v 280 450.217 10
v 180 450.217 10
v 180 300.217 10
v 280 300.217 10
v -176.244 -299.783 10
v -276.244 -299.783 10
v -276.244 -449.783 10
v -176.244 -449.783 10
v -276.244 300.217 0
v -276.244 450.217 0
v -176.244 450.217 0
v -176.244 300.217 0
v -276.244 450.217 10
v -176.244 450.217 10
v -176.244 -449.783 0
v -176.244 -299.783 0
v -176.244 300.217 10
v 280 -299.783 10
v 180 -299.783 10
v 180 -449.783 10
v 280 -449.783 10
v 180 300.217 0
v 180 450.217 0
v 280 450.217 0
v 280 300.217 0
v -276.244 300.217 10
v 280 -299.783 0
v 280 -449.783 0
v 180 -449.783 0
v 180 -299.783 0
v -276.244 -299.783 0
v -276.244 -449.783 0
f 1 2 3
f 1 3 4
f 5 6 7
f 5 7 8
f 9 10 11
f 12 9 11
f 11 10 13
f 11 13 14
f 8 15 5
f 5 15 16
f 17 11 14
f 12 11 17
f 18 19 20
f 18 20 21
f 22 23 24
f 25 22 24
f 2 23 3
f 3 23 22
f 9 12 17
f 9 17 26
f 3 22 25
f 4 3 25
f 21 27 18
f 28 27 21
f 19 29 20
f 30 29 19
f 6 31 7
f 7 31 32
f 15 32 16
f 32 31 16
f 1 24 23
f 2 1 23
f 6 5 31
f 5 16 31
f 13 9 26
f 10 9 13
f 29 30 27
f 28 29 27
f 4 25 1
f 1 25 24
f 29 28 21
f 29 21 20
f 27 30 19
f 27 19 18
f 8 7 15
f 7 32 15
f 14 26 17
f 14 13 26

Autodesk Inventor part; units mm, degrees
ref_plane "YZ Plane" through (0, 0, 0) normal (1, 0, 0) x (0, 1, 0)
ref_plane "XZ Plane" through (0, 0, 0) normal (0, 1, 0) x (-1, 0, 0)
ref_plane "XY Plane" through (0, 0, 0) normal (0, 0, 1) x (1, 0, 0)
ref_plane "Plano de trabajo1" through (0, 0, 0) normal (0, 0, 1) x (1, 0, 0)
sketch "Boceto1" plane through (0, 0, 0) normal (0, 0, 1) x (1, 0, 0)
  line L0 (-296.2443, -449.783) -> (-296.2443, -299.783) projected
  line L1 (-296.2443, 300.217) -> (-296.2443, 450.217) projected
  line L2 (303.7557, 450.217) -> (303.7557, 300.217) projected
  line L3 (303.7557, -299.783) -> (303.7557, -449.783) projected
  line L4 (-276.2443, -449.783) -> (-176.2443, -449.783)
  line L5 (-176.2443, -449.783) -> (-176.2443, -299.783)
  line L6 (-176.2443, -299.783) -> (-276.2443, -299.783)
  line L7 (-276.2443, -299.783) -> (-276.2443, -449.783)
  line L8 (280, -449.783) -> (180, -449.783)
  line L9 (180, -449.783) -> (180, -299.783)
  line L10 (180, -299.783) -> (280, -299.783)
  line L11 (280, -299.783) -> (280, -449.783)
  line L12 (-276.2443, 450.217) -> (-176.2443, 450.217)
  line L13 (-176.2443, 450.217) -> (-176.2443, 300.217)
  line L14 (-176.2443, 300.217) -> (-276.2443, 300.217)
  line L15 (-276.2443, 300.217) -> (-276.2443, 450.217)
  line L16 (280, 450.217) -> (180, 450.217)
  line L17 (180, 450.217) -> (180, 300.217)
  line L18 (180, 300.217) -> (280, 300.217)
  line L19 (280, 300.217) -> (280, 450.217)
  line L20 (300, -450) -> (300, -300) projected
  line L21 (300, 300) -> (300, 450) projected
  point P0 (0, 0)
  dimension "d0" = 100
  dimension "d1" = 100
  dimension "d2" = 100
  dimension "d3" = 100
  dimension "d4" = 20
  dimension "d5" = 20
  dimension "d6" = 20
extrude "Extrusión1" add sketch "Boceto1" along normal blind 10
properties part number "BaseMotor"
